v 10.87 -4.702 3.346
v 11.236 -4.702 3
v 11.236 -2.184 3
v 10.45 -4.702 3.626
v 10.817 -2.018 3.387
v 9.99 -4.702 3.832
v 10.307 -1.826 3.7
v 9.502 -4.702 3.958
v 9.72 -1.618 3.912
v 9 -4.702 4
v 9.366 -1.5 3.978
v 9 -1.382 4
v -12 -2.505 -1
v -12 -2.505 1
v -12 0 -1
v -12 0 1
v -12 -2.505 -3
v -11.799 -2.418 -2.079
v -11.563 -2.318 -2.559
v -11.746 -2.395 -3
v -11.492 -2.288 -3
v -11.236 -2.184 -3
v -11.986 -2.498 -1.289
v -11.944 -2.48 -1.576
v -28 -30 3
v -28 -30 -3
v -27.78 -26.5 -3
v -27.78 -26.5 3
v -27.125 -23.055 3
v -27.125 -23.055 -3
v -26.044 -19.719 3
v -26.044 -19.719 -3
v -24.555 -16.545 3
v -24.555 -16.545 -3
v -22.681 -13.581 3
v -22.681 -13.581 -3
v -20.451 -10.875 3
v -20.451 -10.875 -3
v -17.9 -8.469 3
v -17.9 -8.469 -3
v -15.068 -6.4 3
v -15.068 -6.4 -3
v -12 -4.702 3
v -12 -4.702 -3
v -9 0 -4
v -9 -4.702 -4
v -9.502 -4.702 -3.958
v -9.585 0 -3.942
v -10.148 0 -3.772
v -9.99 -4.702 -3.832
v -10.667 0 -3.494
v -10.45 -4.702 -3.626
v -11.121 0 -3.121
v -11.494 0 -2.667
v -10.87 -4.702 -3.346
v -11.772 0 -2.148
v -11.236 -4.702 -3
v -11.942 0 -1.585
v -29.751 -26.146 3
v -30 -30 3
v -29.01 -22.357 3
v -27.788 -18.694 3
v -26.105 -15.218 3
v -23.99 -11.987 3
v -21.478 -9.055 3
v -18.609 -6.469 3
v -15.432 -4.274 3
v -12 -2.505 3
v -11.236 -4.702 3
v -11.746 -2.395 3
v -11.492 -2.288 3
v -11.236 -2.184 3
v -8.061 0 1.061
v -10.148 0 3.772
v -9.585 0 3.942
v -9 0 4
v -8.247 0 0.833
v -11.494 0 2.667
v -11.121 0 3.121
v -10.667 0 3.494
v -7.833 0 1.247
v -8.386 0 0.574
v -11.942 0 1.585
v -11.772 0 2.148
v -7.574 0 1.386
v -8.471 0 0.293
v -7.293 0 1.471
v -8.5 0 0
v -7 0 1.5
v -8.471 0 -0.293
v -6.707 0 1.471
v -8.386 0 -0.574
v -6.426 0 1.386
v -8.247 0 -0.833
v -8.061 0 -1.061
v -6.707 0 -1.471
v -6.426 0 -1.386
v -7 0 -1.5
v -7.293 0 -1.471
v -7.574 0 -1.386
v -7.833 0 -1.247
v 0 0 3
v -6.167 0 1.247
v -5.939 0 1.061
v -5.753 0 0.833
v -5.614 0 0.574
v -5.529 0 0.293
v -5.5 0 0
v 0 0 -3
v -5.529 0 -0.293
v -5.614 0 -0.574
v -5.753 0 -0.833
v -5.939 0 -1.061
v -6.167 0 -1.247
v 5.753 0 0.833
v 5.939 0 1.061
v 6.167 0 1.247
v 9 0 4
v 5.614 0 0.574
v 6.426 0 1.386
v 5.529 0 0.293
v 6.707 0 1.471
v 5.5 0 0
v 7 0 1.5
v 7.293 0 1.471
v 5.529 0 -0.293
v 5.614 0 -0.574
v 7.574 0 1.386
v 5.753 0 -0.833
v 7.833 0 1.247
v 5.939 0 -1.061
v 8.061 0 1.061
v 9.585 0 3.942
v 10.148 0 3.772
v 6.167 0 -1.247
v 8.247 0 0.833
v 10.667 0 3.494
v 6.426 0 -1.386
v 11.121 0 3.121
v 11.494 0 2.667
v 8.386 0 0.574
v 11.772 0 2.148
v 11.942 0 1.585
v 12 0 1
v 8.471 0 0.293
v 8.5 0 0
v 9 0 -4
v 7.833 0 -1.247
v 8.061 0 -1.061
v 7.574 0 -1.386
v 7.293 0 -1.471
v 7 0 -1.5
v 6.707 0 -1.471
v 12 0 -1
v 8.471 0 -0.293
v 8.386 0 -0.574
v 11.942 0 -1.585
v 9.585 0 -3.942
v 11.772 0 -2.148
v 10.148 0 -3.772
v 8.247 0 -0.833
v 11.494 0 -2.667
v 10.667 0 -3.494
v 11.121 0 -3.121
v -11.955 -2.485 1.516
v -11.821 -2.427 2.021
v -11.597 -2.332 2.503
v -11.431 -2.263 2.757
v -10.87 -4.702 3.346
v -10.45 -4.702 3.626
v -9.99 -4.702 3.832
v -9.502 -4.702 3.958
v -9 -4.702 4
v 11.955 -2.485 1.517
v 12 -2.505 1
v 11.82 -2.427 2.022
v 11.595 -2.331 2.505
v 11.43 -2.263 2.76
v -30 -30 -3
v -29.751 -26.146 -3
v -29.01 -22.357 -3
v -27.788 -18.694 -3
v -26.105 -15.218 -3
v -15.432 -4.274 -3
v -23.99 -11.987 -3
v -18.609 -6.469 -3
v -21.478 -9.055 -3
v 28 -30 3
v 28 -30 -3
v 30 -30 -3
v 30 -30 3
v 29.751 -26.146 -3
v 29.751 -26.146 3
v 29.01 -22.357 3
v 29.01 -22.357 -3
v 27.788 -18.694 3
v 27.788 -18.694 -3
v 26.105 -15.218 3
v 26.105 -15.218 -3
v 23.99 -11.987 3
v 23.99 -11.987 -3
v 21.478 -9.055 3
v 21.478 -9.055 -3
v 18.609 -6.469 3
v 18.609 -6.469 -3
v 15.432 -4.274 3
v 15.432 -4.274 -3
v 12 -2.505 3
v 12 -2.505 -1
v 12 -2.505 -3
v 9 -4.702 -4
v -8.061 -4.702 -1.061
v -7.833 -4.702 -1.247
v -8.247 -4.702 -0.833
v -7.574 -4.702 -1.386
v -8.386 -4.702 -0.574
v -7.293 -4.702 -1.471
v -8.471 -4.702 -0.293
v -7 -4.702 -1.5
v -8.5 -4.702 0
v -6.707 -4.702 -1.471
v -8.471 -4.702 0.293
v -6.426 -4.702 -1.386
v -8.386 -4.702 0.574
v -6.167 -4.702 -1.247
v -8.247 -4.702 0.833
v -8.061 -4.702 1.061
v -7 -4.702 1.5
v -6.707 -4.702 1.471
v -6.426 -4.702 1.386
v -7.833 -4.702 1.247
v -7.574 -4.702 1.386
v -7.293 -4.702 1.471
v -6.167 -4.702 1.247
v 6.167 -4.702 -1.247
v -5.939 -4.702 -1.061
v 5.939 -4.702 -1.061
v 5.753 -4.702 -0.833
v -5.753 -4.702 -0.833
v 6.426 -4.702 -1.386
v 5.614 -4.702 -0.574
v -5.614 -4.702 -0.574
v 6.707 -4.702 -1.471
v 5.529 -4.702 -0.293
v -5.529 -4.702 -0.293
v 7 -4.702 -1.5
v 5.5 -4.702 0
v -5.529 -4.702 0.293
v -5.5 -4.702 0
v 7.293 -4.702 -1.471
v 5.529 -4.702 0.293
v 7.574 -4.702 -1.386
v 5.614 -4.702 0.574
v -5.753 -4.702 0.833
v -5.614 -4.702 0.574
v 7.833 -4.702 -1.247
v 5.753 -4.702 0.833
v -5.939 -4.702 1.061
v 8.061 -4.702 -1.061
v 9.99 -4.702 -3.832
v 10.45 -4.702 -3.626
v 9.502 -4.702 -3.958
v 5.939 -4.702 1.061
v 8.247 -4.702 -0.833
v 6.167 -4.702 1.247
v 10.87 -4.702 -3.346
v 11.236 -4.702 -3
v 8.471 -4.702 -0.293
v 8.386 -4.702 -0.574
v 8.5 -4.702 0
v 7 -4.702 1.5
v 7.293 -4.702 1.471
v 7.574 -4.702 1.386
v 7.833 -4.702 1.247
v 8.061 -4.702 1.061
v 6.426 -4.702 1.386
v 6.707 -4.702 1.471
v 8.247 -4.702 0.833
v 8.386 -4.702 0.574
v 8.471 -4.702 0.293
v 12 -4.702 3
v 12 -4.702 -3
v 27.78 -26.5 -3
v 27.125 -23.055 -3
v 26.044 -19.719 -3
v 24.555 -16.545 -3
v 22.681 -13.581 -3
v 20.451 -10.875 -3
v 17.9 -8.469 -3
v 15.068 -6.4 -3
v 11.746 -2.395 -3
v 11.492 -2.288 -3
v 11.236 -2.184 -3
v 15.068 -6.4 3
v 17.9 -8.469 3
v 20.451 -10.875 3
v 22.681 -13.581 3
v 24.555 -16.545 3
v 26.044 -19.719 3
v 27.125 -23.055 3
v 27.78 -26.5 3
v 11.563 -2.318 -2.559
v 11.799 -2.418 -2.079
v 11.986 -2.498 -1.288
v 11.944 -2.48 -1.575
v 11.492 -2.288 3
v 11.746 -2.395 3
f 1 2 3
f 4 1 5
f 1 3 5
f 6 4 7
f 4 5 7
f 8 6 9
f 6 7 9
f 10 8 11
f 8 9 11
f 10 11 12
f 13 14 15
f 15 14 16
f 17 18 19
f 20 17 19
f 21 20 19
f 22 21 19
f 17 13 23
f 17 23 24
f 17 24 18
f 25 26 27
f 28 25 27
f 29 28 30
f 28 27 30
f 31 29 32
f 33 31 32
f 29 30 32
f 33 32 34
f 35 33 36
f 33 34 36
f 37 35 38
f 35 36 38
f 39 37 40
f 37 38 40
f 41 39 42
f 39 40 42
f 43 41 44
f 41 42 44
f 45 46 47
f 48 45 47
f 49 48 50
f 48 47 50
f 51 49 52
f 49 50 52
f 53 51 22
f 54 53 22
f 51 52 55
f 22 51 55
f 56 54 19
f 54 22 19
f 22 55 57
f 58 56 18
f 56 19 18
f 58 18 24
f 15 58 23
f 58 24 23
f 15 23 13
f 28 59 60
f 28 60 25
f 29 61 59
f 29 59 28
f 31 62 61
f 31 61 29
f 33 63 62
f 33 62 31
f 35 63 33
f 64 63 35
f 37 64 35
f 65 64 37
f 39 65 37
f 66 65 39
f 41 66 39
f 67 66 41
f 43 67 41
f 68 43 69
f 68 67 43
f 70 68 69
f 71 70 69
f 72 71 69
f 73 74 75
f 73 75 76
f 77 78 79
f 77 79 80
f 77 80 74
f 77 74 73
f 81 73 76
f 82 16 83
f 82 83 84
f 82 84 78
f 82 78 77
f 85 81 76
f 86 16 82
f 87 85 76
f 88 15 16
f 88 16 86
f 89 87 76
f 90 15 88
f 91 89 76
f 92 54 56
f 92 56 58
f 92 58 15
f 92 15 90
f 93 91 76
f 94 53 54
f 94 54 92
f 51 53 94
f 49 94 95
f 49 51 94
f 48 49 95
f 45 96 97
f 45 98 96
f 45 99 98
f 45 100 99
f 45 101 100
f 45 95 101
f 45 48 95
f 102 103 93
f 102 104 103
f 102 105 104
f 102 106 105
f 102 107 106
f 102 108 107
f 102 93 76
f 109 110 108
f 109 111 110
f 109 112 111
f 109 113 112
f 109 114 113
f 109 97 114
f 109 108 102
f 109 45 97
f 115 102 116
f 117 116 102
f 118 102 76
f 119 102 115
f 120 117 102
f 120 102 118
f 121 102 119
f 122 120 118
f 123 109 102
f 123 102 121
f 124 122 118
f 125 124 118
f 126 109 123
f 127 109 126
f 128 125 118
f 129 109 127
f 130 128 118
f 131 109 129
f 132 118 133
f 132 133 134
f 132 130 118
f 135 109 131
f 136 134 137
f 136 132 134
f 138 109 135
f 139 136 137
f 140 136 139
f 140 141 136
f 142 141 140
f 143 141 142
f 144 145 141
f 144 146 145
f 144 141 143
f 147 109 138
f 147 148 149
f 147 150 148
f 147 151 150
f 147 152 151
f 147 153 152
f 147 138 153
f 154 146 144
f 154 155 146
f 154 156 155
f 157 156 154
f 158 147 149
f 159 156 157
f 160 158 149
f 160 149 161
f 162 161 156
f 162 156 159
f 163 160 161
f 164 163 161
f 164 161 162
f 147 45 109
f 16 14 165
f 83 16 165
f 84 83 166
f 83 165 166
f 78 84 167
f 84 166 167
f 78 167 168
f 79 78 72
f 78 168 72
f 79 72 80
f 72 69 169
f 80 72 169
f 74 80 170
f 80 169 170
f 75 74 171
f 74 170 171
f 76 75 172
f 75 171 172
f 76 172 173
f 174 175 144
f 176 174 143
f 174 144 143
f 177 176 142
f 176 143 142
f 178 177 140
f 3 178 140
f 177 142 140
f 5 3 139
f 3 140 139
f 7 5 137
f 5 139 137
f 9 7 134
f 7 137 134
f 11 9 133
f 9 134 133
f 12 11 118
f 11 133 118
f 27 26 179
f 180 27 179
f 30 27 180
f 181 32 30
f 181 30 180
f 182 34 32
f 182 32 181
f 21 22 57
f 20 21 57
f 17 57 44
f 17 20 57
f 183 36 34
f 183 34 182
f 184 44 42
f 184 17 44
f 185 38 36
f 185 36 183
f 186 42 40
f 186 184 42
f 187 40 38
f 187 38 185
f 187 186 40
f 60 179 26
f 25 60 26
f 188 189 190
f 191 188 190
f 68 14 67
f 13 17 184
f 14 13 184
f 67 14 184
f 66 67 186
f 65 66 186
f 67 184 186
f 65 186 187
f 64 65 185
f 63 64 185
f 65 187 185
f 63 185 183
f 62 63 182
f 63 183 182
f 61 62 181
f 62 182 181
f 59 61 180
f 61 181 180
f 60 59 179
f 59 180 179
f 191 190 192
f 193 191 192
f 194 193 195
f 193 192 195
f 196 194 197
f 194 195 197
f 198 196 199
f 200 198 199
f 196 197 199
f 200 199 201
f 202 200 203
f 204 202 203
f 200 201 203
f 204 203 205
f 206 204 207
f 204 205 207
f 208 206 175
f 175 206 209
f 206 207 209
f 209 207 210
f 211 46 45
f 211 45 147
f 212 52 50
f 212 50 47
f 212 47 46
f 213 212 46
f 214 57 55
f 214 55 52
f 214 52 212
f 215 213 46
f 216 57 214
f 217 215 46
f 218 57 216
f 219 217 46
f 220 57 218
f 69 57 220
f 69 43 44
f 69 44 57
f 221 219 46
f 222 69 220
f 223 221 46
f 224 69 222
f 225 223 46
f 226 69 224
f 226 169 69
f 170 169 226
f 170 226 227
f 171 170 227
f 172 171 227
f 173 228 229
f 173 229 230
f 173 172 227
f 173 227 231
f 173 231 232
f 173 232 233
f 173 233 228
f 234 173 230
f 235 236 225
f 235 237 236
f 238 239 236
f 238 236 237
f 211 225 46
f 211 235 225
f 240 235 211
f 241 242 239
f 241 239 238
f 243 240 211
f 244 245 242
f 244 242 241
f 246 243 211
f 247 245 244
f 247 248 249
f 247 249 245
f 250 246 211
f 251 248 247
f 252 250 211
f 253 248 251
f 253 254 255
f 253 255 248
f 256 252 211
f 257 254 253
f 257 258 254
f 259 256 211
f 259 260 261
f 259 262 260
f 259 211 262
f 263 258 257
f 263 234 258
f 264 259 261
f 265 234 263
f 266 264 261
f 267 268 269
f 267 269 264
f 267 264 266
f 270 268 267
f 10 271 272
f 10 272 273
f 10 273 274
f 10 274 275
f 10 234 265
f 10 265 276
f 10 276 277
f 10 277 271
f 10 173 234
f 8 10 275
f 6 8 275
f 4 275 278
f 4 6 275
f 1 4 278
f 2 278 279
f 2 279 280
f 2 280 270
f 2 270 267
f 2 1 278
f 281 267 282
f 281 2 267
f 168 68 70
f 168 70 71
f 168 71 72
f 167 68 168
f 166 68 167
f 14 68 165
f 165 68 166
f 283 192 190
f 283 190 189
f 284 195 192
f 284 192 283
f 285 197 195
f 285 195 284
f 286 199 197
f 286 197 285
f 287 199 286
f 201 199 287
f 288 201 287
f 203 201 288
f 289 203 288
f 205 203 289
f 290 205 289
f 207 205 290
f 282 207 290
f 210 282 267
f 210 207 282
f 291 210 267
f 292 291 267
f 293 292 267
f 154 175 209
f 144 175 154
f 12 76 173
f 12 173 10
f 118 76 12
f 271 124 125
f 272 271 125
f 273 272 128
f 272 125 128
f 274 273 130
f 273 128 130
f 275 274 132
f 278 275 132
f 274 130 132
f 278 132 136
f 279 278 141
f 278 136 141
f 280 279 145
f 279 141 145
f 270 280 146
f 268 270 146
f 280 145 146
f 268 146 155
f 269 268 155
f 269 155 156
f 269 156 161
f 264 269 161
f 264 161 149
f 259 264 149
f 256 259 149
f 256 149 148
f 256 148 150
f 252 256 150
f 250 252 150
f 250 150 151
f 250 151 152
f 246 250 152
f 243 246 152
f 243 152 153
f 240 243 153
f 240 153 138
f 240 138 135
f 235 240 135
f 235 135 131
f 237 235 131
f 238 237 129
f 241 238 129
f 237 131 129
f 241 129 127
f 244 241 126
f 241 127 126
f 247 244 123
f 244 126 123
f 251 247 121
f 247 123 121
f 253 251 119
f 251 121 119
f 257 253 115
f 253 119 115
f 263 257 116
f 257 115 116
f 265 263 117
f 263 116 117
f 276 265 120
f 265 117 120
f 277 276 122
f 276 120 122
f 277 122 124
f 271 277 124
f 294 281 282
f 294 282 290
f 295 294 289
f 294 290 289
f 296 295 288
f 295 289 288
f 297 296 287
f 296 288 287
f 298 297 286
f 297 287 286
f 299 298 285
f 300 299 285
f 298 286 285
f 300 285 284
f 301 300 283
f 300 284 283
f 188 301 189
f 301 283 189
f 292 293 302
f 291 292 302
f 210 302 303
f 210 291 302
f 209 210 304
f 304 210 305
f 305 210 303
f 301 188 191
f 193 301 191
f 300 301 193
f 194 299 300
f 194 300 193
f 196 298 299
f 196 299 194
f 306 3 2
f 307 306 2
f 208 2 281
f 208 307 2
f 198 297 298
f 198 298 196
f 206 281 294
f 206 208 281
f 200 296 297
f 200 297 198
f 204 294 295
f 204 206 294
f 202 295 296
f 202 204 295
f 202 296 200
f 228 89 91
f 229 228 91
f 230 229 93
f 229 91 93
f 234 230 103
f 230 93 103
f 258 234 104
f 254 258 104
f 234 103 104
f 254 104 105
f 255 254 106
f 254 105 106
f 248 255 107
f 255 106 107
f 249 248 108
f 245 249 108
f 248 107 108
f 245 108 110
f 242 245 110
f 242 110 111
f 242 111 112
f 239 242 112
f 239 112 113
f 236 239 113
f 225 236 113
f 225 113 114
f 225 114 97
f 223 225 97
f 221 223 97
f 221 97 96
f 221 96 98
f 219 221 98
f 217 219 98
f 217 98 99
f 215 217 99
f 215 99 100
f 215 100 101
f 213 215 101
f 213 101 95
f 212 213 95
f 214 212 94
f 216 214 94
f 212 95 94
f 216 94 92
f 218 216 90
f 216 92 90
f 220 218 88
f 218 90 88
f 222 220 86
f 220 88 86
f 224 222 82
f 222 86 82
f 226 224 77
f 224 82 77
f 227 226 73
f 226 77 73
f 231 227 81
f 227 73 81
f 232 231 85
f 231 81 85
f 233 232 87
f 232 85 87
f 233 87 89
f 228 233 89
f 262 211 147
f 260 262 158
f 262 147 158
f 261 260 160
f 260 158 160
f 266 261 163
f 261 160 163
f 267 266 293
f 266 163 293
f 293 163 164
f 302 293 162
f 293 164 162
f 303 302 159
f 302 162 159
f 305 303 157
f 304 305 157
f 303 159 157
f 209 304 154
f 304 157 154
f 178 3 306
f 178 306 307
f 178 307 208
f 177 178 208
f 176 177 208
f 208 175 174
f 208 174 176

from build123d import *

# Parameters (mm, degrees)
SKETCH_2_W           = 24
SKETCH_2_H           = 8
EXTRUDE_1_DEPTH      = 1
EXTRUDE_3_DEPTH      = 3
EXTRUDE_3_DEPTH_BACK = 3
EXTRUDE_5_REACH      = 45.174
SKETCH_7_W           = 24
SKETCH_7_H           = 4.701778719
SKETCH_3_R           = 1.5
CUT_EXTRUDE_1_DEPTH  = 43.614551505
FILLET_1_R           = 3


with BuildPart() as part:
    # 草图2 → 凸台-拉伸1 (new body)
    with BuildSketch(Plane(origin=(0, 0, 0), x_dir=(1, 0, 0), z_dir=(0, 1, 0))):
        Rectangle(SKETCH_2_W, SKETCH_2_H)
    extrude(amount=-EXTRUDE_1_DEPTH)

    # 凸台-拉伸5: up to this face of the body (flat: up to its plane)
    extrude_5_end = Plane(part.part.faces().sort_by_distance((0, -0.5, -4))[0])
    # 草图7 → 凸台-拉伸5 (add, up to the picked face)
    with BuildSketch(Plane.XY.offset(4), mode=Mode.PRIVATE) as extrude_5_sk1:
        with Locations((0, -2.350889359)):
            Rectangle(SKETCH_7_W, SKETCH_7_H)
    extrude_5_tool1 = split(extrude(extrude_5_sk1.sketch, amount=-EXTRUDE_5_REACH, mode=Mode.PRIVATE), bisect_by=extrude_5_end, keep=Keep.BOTH, mode=Mode.PRIVATE)


with BuildPart() as body_2:
    # 草图5 → 凸台-拉伸3 (new, two sides: drawn at the far end of the back side and taken through both)
    with BuildSketch(Plane.XY.offset(-EXTRUDE_3_DEPTH_BACK)):
        with BuildLine():
            ThreePointArc((30, -30), (21.213203436, -8.786796564), (0, 0))
            Line((0, 0), (0, -2))
            ThreePointArc((0, -2), (19.798989873, -10.201010127), (28, -30))
            Line((28, -30), (30, -30))
        make_face()
        with BuildLine():
            Line((0, -2), (0, 0))
            ThreePointArc((0, 0), (-21.213203436, -8.786796564), (-30, -30))
            Line((-30, -30), (-28, -30))
            ThreePointArc((-28, -30), (-19.798989873, -10.201010127), (0, -2))
        make_face()
    extrude(amount=EXTRUDE_3_DEPTH + EXTRUDE_3_DEPTH_BACK)


with BuildPart() as part_1:
    add(part.part)

    add(body_2.part)  # 凸台-拉伸5 merges body 2
    add(extrude_5_tool1.solids().sort_by(Axis((0, -2.350889, 4), (0, 0, -1)))[0])

    # 草图3 → 切除-拉伸1 (cut, through all)
    with BuildSketch(Plane(origin=(0, 0, 0), x_dir=(1, 0, 0), z_dir=(0, 1, 0))):
        with Locations(Location((-7, 0, 0), (0, 0, 270))):
            Circle(SKETCH_3_R)
        with Locations(Location((7, 0, 0), (0, 0, 270))):
            Circle(SKETCH_3_R)
    extrude(amount=-CUT_EXTRUDE_1_DEPTH, mode=Mode.SUBTRACT)

    # 圆角1
    # the kernel refuses this fillet: 3 mm, written as the material it takes off along each edge
    with BuildSketch(Plane(origin=(-12, -12.201778719, 4), x_dir=(0, 0, -1), z_dir=(0, 1, 0))) as fillet_1_piece_1_section:
        with BuildLine():
            CenterArc((FILLET_1_R, -FILLET_1_R), FILLET_1_R, 90, 90)
            Line((0, -FILLET_1_R), (0, 0))
            Line((0, 0), (FILLET_1_R, 0))
        make_face()
    fillet_1_piece_1 = extrude(amount=19.701778719, mode=Mode.PRIVATE)
    fillet_1_piece_1 = split(fillet_1_piece_1, bisect_by=Plane(origin=(-10.804220272, -4.438855897, 3), z_dir=(0, 0, 1)), keep=Keep.TOP, mode=Mode.PRIVATE)
    add(fillet_1_piece_1, mode=Mode.SUBTRACT)
    with BuildSketch(Plane(origin=(-12, -12.201778719, 4), x_dir=(0, 0, -1), z_dir=(0, 1, 0))) as fillet_1_piece_2_section:
        with BuildLine():
            CenterArc((FILLET_1_R, -FILLET_1_R), FILLET_1_R, 90, 90)
            Line((0, -FILLET_1_R), (0, 0))
            Line((0, 0), (FILLET_1_R, 0))
        make_face()
    fillet_1_piece_2 = extrude(amount=19.701778719, mode=Mode.PRIVATE)
    fillet_1_piece_2 = fillet_1_piece_2 - Plane(origin=(0, -30, 2.5069518), x_dir=(1, 0, 0), z_dir=(0, 0, -1)) * Cylinder(30, 52, mode=Mode.PRIVATE)
    add(fillet_1_piece_2, mode=Mode.SUBTRACT)
    with BuildSketch(Plane(origin=(-12, -12.201778719, -4), x_dir=(1, 0, 0), z_dir=(0, 1, 0))) as fillet_1_piece_3_section:
        with BuildLine():
            CenterArc((FILLET_1_R, -FILLET_1_R), FILLET_1_R, 90, 90)
            Line((0, -FILLET_1_R), (0, 0))
            Line((0, 0), (FILLET_1_R, 0))
        make_face()
    fillet_1_piece_3 = extrude(amount=19.701778719, mode=Mode.PRIVATE)
    fillet_1_piece_3 = split(fillet_1_piece_3, bisect_by=Plane(origin=(-10.804220065, -4.438855826, -3), z_dir=(0, 0, -1)), keep=Keep.TOP, mode=Mode.PRIVATE)
    add(fillet_1_piece_3, mode=Mode.SUBTRACT)
    with BuildSketch(Plane(origin=(-12, -12.201778719, -4), x_dir=(1, 0, 0), z_dir=(0, 1, 0))) as fillet_1_piece_4_section:
        with BuildLine():
            CenterArc((FILLET_1_R, -FILLET_1_R), FILLET_1_R, 90, 90)
            Line((0, -FILLET_1_R), (0, 0))
            Line((0, 0), (FILLET_1_R, 0))
        make_face()
    fillet_1_piece_4 = extrude(amount=19.701778719, mode=Mode.PRIVATE)
    fillet_1_piece_4 = fillet_1_piece_4 - Plane(origin=(0, -30, -2.506951801), x_dir=(1, 0, 0), z_dir=(0, 0, -1)) * Cylinder(30, 52, mode=Mode.PRIVATE)
    add(fillet_1_piece_4, mode=Mode.SUBTRACT)
    with BuildSketch(Plane(origin=(12, 7.5, 4), x_dir=(0, 0, -1), z_dir=(0, -1, 0))) as fillet_1_piece_5_section:
        with BuildLine():
            CenterArc((FILLET_1_R, -FILLET_1_R), FILLET_1_R, 90, 90)
            Line((0, -FILLET_1_R), (0, 0))
            Line((0, 0), (FILLET_1_R, 0))
        make_face()
    fillet_1_piece_5 = extrude(amount=19.701778719, mode=Mode.PRIVATE)
    fillet_1_piece_5 = fillet_1_piece_5 - Plane(origin=(0, -30, 2.506951802), x_dir=(1, 0, 0), z_dir=(0, 0, -1)) * Cylinder(30, 52, mode=Mode.PRIVATE)
    add(fillet_1_piece_5, mode=Mode.SUBTRACT)
    with BuildSketch(Plane(origin=(12, 7.5, 4), x_dir=(0, 0, -1), z_dir=(0, -1, 0))) as fillet_1_piece_6_section:
        with BuildLine():
            CenterArc((FILLET_1_R, -FILLET_1_R), FILLET_1_R, 90, 90)
            Line((0, -FILLET_1_R), (0, 0))
            Line((0, 0), (FILLET_1_R, 0))
        make_face()
    fillet_1_piece_6 = extrude(amount=19.701778719, mode=Mode.PRIVATE)
    fillet_1_piece_6 = split(fillet_1_piece_6, bisect_by=Plane(origin=(11.186935792, -3.254885209, 3), z_dir=(0, 0, 1)), keep=Keep.TOP, mode=Mode.PRIVATE)
    add(fillet_1_piece_6, mode=Mode.SUBTRACT)
    with BuildSketch(Plane(origin=(12, 7.5, -4), x_dir=(-1, 0, 0), z_dir=(0, -1, 0))) as fillet_1_piece_7_section:
        with BuildLine():
            CenterArc((FILLET_1_R, -FILLET_1_R), FILLET_1_R, 90, 90)
            Line((0, -FILLET_1_R), (0, 0))
            Line((0, 0), (FILLET_1_R, 0))
        make_face()
    fillet_1_piece_7 = extrude(amount=19.701778719, mode=Mode.PRIVATE)
    fillet_1_piece_7 = split(fillet_1_piece_7, bisect_by=Plane(origin=(11.240609722, -1.095811506, -3), z_dir=(0, 0, -1)), keep=Keep.TOP, mode=Mode.PRIVATE)
    add(fillet_1_piece_7, mode=Mode.SUBTRACT)
    with BuildSketch(Plane(origin=(12, 7.5, -4), x_dir=(-1, 0, 0), z_dir=(0, -1, 0))) as fillet_1_piece_8_section:
        with BuildLine():
            CenterArc((FILLET_1_R, -FILLET_1_R), FILLET_1_R, 90, 90)
            Line((0, -FILLET_1_R), (0, 0))
            Line((0, 0), (FILLET_1_R, 0))
        make_face()
    fillet_1_piece_8 = extrude(amount=19.701778719, mode=Mode.PRIVATE)
    fillet_1_piece_8 = fillet_1_piece_8 - Plane(origin=(0, -30, -2.506951802), x_dir=(1, 0, 0), z_dir=(0, 0, -1)) * Cylinder(30, 52, mode=Mode.PRIVATE)
    add(fillet_1_piece_8, mode=Mode.SUBTRACT)


solid = part_1.part
